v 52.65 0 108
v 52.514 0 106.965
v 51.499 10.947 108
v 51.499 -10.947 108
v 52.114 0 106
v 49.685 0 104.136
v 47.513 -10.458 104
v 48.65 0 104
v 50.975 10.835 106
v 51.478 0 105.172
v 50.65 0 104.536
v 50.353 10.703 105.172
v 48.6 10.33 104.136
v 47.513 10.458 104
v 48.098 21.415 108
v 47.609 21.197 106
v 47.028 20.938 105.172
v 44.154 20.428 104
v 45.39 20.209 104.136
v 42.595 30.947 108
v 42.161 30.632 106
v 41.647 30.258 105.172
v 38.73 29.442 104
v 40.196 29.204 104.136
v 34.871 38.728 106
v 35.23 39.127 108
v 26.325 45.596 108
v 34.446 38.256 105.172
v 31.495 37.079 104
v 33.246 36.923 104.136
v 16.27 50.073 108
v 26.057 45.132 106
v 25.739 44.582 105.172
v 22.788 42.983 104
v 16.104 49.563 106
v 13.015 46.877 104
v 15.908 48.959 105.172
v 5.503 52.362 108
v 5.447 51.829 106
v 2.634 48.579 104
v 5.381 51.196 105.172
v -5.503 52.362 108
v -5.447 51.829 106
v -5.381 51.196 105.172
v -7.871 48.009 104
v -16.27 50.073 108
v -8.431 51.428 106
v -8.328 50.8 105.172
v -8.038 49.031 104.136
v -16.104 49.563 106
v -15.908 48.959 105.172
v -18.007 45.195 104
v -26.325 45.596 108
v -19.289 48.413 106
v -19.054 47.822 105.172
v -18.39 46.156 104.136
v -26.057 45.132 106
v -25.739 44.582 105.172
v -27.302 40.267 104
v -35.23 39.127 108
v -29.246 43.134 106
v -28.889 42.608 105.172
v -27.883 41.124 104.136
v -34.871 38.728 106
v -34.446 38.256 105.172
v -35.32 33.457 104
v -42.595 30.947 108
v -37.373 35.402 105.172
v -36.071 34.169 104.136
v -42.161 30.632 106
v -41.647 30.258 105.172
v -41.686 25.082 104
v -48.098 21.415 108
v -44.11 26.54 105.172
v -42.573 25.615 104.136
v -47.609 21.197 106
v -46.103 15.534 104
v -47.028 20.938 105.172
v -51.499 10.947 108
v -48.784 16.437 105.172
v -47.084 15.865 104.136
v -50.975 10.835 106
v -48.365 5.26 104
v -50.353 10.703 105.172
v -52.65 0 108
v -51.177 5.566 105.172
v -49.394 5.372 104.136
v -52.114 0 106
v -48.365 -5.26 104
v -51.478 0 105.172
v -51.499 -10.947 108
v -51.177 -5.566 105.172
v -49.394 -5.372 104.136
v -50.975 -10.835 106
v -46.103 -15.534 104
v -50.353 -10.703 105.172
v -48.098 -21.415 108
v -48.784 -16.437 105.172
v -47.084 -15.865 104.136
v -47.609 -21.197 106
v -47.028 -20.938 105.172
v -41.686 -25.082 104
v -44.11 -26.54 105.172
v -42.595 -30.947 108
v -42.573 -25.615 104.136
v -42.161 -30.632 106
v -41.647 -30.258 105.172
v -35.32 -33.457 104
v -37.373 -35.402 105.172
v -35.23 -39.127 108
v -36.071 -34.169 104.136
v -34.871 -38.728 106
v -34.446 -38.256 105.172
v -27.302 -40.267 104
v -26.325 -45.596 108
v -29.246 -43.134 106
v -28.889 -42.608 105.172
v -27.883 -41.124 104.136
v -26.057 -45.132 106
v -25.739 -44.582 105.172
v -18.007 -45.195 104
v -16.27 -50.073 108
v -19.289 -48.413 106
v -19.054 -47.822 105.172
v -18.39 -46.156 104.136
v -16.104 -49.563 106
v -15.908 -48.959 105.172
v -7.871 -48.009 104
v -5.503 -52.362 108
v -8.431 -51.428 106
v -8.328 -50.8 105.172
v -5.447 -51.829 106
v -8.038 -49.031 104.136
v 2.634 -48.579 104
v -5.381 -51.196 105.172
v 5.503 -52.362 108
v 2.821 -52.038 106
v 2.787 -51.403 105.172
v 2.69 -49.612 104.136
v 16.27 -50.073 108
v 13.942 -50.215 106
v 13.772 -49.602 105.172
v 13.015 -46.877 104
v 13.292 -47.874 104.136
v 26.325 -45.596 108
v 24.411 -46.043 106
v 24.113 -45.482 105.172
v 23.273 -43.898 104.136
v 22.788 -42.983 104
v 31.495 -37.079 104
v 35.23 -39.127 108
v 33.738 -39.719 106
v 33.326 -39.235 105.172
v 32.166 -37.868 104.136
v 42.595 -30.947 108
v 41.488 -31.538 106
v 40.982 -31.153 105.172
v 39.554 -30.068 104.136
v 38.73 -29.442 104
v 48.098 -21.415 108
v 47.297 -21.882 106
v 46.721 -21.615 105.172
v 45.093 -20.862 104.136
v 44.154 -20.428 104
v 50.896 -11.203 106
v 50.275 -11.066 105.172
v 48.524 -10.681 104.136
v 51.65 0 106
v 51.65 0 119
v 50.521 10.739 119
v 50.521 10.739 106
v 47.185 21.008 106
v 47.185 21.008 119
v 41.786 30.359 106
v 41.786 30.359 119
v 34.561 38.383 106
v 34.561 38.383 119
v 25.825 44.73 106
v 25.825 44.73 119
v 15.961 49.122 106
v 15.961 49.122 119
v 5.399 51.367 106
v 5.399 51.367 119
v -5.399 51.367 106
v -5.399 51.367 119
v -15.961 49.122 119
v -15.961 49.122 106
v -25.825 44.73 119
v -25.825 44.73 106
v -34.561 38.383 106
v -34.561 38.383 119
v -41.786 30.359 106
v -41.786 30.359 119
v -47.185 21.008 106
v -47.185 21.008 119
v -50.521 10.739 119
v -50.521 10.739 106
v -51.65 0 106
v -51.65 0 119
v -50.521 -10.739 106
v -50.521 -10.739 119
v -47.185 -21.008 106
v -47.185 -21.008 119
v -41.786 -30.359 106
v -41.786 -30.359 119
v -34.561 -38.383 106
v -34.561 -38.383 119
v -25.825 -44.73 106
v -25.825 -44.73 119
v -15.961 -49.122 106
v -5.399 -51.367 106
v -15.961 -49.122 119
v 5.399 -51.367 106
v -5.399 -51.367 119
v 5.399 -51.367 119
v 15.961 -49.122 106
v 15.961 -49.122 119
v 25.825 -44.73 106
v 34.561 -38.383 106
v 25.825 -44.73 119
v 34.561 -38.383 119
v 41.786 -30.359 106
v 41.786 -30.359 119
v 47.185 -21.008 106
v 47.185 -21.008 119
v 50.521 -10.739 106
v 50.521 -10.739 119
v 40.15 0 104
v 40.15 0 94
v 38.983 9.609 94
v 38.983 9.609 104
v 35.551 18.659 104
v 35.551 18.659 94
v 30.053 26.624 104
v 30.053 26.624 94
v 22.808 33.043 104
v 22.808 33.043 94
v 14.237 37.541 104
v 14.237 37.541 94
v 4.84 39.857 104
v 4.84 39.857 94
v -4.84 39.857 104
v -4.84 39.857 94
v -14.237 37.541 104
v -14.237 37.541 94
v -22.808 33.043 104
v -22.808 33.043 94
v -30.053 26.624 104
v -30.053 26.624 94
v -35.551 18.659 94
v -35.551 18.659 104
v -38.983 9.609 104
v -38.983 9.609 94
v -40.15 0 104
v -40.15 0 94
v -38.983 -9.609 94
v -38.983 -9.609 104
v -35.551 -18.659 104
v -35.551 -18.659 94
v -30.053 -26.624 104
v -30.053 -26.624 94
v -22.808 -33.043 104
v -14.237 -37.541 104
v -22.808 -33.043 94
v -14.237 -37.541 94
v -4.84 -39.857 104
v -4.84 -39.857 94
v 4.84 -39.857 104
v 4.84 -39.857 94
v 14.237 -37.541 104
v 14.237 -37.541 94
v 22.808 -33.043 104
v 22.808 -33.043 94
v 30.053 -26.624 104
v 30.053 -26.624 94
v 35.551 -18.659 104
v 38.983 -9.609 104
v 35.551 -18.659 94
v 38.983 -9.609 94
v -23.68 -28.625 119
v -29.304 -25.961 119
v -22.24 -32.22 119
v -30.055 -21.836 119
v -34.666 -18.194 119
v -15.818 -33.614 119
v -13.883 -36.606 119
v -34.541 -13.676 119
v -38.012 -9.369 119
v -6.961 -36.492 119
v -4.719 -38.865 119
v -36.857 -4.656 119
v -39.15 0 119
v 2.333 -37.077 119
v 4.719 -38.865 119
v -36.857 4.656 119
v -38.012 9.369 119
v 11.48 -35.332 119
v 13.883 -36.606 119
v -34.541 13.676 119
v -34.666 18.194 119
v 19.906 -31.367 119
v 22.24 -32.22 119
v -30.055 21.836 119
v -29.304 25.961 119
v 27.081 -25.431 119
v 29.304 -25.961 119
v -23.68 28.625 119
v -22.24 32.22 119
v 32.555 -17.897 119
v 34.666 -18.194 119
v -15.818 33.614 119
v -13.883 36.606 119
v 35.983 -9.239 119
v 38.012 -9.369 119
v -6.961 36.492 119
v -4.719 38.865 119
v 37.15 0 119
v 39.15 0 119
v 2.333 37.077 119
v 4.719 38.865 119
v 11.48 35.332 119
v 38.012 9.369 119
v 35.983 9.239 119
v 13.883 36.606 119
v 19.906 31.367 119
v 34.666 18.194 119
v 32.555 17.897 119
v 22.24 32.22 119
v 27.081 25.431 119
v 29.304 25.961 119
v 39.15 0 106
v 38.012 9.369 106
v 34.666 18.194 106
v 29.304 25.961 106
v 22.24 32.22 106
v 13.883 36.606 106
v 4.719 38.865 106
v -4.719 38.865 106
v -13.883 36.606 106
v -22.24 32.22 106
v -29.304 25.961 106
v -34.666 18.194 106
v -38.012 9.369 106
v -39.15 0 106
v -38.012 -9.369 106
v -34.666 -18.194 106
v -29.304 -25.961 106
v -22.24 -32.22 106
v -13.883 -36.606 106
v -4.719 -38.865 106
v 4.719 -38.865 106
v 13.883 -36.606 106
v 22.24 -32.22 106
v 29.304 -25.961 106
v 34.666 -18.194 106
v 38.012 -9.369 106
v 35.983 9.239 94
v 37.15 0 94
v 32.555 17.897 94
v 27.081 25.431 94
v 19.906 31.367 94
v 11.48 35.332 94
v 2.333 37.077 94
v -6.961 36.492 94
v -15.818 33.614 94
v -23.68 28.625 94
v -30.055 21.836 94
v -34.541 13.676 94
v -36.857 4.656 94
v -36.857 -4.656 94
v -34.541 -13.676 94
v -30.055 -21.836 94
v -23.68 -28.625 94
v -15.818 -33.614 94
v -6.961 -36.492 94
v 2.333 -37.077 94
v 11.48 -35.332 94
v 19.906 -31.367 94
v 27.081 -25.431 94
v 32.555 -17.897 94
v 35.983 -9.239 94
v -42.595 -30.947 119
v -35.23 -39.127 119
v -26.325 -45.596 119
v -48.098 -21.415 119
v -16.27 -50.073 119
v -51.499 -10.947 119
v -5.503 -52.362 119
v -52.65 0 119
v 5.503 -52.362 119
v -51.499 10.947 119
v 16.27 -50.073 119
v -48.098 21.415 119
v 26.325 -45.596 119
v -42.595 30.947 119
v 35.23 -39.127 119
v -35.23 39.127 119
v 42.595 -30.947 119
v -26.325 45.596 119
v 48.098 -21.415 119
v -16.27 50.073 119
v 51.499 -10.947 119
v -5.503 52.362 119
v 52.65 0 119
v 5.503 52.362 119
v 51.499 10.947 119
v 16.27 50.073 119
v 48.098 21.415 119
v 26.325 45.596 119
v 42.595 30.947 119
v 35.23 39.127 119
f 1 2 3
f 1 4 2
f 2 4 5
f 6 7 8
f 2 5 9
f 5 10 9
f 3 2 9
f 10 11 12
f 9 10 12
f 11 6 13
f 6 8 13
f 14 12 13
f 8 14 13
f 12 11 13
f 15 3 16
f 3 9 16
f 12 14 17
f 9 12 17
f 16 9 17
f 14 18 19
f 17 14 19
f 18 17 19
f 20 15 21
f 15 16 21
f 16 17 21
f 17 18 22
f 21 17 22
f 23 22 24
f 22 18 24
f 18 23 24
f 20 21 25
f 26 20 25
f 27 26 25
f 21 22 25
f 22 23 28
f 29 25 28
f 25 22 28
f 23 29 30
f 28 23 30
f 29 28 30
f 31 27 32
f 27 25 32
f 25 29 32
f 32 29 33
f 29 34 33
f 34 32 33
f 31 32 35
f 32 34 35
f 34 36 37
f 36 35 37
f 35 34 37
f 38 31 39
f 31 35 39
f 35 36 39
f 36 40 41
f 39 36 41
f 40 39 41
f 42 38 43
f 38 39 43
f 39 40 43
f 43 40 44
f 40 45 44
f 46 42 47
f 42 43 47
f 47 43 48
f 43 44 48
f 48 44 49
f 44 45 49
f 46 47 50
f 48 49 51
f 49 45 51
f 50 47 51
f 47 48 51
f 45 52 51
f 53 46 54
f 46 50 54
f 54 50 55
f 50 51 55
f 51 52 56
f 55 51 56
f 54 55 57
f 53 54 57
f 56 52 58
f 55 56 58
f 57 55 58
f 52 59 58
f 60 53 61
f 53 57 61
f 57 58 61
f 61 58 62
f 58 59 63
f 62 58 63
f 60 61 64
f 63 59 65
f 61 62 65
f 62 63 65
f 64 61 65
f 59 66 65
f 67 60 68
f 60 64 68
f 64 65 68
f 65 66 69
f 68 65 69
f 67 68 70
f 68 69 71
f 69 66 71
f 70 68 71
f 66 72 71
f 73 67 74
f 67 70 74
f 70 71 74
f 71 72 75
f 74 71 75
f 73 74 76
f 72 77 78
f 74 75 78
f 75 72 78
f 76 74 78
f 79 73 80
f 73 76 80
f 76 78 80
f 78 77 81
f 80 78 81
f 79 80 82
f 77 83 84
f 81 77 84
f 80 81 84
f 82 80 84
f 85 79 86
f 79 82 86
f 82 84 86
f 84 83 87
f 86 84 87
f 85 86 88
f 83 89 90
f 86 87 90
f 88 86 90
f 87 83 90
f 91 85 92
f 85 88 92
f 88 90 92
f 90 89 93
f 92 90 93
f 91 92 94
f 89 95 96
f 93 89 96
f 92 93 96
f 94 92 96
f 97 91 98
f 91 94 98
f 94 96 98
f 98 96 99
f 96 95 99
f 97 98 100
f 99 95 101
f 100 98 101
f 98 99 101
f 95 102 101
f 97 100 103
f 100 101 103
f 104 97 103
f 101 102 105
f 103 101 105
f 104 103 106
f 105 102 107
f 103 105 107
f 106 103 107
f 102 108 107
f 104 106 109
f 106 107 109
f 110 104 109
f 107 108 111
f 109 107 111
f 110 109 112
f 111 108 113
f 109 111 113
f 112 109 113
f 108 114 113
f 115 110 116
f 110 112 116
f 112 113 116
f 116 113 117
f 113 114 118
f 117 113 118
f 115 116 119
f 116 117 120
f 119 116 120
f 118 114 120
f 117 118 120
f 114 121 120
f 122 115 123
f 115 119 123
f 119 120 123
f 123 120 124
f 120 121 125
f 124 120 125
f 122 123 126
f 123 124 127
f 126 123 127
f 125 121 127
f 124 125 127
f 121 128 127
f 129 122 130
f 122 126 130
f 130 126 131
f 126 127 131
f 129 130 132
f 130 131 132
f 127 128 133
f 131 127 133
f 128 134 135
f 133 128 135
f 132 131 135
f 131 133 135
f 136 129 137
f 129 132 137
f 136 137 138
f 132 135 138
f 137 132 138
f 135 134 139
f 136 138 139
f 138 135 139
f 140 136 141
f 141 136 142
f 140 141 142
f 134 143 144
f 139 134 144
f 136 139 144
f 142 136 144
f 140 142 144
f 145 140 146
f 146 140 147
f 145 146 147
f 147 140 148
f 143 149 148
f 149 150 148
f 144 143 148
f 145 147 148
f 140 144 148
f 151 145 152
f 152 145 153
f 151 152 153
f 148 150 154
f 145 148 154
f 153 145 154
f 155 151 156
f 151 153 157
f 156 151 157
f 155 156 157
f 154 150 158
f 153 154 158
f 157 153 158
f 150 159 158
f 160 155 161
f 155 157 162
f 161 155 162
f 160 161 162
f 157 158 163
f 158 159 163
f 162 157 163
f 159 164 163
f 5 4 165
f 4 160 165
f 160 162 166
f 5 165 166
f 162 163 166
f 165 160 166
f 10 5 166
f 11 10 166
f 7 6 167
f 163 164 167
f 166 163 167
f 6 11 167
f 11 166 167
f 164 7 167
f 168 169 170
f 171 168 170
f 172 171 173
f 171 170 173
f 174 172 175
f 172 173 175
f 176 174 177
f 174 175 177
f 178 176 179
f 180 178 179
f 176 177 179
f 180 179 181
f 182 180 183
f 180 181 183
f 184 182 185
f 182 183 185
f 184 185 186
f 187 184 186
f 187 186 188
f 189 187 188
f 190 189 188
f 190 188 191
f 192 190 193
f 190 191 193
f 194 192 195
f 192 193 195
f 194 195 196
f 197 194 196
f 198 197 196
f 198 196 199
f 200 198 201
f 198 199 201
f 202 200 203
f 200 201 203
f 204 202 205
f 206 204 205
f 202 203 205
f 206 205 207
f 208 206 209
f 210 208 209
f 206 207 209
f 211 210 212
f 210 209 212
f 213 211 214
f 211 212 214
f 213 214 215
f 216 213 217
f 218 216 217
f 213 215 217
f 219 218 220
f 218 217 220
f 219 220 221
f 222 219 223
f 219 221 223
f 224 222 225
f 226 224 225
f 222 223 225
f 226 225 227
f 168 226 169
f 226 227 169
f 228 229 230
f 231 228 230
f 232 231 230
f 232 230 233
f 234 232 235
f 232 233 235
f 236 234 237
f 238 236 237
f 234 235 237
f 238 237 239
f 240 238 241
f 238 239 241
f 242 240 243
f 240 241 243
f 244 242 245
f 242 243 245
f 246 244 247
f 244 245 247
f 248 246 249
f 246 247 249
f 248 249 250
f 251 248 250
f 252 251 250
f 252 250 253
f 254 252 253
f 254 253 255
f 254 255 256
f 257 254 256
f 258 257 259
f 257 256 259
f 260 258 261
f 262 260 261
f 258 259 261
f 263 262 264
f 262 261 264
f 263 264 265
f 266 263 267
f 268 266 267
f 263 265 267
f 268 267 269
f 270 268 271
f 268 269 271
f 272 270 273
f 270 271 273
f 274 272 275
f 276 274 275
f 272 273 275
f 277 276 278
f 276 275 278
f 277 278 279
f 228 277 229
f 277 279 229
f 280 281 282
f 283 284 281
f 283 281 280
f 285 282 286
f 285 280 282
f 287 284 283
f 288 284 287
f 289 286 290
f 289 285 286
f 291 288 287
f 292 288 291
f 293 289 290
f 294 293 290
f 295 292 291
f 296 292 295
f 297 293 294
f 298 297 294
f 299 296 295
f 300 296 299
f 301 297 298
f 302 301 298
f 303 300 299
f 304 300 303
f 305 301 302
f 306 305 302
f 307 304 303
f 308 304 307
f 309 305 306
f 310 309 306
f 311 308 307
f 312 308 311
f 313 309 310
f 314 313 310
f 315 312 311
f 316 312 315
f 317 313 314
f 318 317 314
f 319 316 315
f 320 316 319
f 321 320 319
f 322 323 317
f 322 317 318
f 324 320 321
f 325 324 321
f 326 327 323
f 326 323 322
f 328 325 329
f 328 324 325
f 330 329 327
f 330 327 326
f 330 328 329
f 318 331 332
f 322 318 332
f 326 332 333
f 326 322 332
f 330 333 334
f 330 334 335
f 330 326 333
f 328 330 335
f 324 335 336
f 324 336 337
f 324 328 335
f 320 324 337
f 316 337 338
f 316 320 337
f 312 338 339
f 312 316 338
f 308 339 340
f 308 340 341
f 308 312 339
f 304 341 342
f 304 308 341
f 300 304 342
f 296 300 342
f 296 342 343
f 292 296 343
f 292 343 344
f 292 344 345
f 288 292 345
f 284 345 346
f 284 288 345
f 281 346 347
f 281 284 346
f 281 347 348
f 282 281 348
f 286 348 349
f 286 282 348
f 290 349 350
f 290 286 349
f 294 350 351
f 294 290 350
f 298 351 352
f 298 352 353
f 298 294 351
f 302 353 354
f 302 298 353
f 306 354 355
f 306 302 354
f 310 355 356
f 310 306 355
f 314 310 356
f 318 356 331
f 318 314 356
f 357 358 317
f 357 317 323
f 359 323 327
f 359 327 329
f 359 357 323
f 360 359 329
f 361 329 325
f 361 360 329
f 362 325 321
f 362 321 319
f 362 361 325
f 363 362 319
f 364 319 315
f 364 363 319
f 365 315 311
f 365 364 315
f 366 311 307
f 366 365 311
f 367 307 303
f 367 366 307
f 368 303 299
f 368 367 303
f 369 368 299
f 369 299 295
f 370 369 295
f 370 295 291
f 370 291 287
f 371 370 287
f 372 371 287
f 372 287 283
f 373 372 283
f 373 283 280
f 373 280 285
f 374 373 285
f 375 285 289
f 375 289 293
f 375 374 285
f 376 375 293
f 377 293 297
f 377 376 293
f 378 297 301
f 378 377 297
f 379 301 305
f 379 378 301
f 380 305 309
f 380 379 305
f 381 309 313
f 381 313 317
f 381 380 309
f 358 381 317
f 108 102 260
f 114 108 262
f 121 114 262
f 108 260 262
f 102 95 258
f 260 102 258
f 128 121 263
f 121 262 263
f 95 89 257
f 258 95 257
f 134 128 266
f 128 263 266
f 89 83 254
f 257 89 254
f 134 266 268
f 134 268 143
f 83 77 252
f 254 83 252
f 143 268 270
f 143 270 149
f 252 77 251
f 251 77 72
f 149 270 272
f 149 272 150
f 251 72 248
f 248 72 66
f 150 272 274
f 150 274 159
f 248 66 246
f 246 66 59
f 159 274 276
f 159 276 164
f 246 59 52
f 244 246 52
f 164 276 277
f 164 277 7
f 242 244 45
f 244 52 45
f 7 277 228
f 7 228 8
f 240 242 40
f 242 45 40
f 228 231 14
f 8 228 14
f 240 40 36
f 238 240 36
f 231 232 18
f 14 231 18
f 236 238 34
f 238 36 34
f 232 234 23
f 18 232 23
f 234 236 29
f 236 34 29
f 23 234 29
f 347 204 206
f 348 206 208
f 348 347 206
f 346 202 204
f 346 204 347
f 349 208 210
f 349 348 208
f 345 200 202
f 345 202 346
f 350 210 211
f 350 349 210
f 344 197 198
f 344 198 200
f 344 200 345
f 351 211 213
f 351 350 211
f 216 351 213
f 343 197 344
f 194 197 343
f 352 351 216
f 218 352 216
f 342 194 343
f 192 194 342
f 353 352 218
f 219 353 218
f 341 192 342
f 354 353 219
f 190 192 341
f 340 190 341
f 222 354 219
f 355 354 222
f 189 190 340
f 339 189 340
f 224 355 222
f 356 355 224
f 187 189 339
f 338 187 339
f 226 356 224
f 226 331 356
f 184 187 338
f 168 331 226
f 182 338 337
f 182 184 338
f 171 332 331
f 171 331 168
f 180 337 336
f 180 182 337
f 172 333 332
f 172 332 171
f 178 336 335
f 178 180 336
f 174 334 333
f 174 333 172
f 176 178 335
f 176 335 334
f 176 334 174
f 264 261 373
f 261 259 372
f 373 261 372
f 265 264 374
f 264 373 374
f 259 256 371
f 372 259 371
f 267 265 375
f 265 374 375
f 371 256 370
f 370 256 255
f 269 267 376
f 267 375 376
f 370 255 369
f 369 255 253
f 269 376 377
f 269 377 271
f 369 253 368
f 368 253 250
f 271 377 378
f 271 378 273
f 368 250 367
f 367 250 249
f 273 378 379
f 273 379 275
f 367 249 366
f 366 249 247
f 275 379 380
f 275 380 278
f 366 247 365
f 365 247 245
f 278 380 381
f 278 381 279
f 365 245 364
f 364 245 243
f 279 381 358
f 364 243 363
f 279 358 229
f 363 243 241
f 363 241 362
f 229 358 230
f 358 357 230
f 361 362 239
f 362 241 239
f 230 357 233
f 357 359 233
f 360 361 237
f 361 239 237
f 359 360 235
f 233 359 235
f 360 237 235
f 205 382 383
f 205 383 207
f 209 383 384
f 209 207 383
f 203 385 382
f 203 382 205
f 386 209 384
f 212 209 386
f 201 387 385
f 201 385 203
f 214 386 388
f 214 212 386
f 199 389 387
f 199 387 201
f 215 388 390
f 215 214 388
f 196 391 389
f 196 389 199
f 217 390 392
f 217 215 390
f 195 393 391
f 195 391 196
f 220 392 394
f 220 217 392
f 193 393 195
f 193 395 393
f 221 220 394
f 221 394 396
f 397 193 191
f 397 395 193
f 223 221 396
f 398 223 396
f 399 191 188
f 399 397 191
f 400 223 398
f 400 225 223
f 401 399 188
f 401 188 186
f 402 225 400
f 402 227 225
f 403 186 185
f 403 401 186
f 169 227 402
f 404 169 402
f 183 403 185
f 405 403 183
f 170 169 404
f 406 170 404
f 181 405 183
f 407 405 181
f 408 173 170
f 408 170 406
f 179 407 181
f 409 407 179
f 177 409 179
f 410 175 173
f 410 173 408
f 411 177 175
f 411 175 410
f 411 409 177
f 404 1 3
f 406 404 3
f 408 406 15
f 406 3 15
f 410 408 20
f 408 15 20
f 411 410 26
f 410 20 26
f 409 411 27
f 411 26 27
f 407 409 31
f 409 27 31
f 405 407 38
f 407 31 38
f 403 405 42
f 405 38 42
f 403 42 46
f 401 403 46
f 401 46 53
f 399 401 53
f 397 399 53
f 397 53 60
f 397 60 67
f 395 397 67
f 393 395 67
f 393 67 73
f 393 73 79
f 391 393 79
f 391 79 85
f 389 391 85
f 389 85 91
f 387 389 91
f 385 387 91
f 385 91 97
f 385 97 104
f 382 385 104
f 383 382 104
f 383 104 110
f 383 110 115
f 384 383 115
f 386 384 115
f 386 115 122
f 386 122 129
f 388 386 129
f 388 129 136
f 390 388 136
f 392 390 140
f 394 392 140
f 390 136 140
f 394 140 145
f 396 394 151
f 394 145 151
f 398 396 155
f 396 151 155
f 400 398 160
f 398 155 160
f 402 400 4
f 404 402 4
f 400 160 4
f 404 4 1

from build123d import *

# Parameters (mm, degrees)
SKETCH055_R        = 52.65
SKETCH055_R_2      = 37.15
PAD023_DEPTH       = 25
SKETCH056_R        = 52.65
SKETCH056_R_2      = 40.15
POCKET003021_DEPTH = 10
SKETCH057_R        = 51.65
SKETCH057_R_2      = 39.15
POCKET003022_DEPTH = 13
FILLET_R           = 4


with BuildPart() as part:
    # Sketch055 → Pad023 (new body)
    with BuildSketch(Plane.XY.offset(80)):
        Circle(SKETCH055_R)
        Circle(SKETCH055_R_2, mode=Mode.SUBTRACT)
    extrude(amount=PAD023_DEPTH)

    # Sketch056 → Pocket003021 (cut)
    with BuildSketch(Plane.XY.offset(80)):
        Circle(SKETCH056_R)
        Circle(SKETCH056_R_2, mode=Mode.SUBTRACT)
    extrude(amount=POCKET003021_DEPTH, mode=Mode.SUBTRACT)

    # Sketch057 → Pocket003022 (cut)
    with BuildSketch(Plane.XY.offset(105)):
        Circle(SKETCH057_R)
        Circle(SKETCH057_R_2, mode=Mode.SUBTRACT)
    extrude(amount=-POCKET003022_DEPTH, mode=Mode.SUBTRACT)

    # Fillet
    fillet_edges = [part.edges().sort_by_distance(p)[0] for p in [
        (-52.65, 0, 90),
    ]]
    fillet(fillet_edges, radius=FILLET_R)


with BuildPart() as part_1:
    # Body010 placement: moved
    add(part.part.moved(Location((0, 0, 14))))


solid = part_1.part
